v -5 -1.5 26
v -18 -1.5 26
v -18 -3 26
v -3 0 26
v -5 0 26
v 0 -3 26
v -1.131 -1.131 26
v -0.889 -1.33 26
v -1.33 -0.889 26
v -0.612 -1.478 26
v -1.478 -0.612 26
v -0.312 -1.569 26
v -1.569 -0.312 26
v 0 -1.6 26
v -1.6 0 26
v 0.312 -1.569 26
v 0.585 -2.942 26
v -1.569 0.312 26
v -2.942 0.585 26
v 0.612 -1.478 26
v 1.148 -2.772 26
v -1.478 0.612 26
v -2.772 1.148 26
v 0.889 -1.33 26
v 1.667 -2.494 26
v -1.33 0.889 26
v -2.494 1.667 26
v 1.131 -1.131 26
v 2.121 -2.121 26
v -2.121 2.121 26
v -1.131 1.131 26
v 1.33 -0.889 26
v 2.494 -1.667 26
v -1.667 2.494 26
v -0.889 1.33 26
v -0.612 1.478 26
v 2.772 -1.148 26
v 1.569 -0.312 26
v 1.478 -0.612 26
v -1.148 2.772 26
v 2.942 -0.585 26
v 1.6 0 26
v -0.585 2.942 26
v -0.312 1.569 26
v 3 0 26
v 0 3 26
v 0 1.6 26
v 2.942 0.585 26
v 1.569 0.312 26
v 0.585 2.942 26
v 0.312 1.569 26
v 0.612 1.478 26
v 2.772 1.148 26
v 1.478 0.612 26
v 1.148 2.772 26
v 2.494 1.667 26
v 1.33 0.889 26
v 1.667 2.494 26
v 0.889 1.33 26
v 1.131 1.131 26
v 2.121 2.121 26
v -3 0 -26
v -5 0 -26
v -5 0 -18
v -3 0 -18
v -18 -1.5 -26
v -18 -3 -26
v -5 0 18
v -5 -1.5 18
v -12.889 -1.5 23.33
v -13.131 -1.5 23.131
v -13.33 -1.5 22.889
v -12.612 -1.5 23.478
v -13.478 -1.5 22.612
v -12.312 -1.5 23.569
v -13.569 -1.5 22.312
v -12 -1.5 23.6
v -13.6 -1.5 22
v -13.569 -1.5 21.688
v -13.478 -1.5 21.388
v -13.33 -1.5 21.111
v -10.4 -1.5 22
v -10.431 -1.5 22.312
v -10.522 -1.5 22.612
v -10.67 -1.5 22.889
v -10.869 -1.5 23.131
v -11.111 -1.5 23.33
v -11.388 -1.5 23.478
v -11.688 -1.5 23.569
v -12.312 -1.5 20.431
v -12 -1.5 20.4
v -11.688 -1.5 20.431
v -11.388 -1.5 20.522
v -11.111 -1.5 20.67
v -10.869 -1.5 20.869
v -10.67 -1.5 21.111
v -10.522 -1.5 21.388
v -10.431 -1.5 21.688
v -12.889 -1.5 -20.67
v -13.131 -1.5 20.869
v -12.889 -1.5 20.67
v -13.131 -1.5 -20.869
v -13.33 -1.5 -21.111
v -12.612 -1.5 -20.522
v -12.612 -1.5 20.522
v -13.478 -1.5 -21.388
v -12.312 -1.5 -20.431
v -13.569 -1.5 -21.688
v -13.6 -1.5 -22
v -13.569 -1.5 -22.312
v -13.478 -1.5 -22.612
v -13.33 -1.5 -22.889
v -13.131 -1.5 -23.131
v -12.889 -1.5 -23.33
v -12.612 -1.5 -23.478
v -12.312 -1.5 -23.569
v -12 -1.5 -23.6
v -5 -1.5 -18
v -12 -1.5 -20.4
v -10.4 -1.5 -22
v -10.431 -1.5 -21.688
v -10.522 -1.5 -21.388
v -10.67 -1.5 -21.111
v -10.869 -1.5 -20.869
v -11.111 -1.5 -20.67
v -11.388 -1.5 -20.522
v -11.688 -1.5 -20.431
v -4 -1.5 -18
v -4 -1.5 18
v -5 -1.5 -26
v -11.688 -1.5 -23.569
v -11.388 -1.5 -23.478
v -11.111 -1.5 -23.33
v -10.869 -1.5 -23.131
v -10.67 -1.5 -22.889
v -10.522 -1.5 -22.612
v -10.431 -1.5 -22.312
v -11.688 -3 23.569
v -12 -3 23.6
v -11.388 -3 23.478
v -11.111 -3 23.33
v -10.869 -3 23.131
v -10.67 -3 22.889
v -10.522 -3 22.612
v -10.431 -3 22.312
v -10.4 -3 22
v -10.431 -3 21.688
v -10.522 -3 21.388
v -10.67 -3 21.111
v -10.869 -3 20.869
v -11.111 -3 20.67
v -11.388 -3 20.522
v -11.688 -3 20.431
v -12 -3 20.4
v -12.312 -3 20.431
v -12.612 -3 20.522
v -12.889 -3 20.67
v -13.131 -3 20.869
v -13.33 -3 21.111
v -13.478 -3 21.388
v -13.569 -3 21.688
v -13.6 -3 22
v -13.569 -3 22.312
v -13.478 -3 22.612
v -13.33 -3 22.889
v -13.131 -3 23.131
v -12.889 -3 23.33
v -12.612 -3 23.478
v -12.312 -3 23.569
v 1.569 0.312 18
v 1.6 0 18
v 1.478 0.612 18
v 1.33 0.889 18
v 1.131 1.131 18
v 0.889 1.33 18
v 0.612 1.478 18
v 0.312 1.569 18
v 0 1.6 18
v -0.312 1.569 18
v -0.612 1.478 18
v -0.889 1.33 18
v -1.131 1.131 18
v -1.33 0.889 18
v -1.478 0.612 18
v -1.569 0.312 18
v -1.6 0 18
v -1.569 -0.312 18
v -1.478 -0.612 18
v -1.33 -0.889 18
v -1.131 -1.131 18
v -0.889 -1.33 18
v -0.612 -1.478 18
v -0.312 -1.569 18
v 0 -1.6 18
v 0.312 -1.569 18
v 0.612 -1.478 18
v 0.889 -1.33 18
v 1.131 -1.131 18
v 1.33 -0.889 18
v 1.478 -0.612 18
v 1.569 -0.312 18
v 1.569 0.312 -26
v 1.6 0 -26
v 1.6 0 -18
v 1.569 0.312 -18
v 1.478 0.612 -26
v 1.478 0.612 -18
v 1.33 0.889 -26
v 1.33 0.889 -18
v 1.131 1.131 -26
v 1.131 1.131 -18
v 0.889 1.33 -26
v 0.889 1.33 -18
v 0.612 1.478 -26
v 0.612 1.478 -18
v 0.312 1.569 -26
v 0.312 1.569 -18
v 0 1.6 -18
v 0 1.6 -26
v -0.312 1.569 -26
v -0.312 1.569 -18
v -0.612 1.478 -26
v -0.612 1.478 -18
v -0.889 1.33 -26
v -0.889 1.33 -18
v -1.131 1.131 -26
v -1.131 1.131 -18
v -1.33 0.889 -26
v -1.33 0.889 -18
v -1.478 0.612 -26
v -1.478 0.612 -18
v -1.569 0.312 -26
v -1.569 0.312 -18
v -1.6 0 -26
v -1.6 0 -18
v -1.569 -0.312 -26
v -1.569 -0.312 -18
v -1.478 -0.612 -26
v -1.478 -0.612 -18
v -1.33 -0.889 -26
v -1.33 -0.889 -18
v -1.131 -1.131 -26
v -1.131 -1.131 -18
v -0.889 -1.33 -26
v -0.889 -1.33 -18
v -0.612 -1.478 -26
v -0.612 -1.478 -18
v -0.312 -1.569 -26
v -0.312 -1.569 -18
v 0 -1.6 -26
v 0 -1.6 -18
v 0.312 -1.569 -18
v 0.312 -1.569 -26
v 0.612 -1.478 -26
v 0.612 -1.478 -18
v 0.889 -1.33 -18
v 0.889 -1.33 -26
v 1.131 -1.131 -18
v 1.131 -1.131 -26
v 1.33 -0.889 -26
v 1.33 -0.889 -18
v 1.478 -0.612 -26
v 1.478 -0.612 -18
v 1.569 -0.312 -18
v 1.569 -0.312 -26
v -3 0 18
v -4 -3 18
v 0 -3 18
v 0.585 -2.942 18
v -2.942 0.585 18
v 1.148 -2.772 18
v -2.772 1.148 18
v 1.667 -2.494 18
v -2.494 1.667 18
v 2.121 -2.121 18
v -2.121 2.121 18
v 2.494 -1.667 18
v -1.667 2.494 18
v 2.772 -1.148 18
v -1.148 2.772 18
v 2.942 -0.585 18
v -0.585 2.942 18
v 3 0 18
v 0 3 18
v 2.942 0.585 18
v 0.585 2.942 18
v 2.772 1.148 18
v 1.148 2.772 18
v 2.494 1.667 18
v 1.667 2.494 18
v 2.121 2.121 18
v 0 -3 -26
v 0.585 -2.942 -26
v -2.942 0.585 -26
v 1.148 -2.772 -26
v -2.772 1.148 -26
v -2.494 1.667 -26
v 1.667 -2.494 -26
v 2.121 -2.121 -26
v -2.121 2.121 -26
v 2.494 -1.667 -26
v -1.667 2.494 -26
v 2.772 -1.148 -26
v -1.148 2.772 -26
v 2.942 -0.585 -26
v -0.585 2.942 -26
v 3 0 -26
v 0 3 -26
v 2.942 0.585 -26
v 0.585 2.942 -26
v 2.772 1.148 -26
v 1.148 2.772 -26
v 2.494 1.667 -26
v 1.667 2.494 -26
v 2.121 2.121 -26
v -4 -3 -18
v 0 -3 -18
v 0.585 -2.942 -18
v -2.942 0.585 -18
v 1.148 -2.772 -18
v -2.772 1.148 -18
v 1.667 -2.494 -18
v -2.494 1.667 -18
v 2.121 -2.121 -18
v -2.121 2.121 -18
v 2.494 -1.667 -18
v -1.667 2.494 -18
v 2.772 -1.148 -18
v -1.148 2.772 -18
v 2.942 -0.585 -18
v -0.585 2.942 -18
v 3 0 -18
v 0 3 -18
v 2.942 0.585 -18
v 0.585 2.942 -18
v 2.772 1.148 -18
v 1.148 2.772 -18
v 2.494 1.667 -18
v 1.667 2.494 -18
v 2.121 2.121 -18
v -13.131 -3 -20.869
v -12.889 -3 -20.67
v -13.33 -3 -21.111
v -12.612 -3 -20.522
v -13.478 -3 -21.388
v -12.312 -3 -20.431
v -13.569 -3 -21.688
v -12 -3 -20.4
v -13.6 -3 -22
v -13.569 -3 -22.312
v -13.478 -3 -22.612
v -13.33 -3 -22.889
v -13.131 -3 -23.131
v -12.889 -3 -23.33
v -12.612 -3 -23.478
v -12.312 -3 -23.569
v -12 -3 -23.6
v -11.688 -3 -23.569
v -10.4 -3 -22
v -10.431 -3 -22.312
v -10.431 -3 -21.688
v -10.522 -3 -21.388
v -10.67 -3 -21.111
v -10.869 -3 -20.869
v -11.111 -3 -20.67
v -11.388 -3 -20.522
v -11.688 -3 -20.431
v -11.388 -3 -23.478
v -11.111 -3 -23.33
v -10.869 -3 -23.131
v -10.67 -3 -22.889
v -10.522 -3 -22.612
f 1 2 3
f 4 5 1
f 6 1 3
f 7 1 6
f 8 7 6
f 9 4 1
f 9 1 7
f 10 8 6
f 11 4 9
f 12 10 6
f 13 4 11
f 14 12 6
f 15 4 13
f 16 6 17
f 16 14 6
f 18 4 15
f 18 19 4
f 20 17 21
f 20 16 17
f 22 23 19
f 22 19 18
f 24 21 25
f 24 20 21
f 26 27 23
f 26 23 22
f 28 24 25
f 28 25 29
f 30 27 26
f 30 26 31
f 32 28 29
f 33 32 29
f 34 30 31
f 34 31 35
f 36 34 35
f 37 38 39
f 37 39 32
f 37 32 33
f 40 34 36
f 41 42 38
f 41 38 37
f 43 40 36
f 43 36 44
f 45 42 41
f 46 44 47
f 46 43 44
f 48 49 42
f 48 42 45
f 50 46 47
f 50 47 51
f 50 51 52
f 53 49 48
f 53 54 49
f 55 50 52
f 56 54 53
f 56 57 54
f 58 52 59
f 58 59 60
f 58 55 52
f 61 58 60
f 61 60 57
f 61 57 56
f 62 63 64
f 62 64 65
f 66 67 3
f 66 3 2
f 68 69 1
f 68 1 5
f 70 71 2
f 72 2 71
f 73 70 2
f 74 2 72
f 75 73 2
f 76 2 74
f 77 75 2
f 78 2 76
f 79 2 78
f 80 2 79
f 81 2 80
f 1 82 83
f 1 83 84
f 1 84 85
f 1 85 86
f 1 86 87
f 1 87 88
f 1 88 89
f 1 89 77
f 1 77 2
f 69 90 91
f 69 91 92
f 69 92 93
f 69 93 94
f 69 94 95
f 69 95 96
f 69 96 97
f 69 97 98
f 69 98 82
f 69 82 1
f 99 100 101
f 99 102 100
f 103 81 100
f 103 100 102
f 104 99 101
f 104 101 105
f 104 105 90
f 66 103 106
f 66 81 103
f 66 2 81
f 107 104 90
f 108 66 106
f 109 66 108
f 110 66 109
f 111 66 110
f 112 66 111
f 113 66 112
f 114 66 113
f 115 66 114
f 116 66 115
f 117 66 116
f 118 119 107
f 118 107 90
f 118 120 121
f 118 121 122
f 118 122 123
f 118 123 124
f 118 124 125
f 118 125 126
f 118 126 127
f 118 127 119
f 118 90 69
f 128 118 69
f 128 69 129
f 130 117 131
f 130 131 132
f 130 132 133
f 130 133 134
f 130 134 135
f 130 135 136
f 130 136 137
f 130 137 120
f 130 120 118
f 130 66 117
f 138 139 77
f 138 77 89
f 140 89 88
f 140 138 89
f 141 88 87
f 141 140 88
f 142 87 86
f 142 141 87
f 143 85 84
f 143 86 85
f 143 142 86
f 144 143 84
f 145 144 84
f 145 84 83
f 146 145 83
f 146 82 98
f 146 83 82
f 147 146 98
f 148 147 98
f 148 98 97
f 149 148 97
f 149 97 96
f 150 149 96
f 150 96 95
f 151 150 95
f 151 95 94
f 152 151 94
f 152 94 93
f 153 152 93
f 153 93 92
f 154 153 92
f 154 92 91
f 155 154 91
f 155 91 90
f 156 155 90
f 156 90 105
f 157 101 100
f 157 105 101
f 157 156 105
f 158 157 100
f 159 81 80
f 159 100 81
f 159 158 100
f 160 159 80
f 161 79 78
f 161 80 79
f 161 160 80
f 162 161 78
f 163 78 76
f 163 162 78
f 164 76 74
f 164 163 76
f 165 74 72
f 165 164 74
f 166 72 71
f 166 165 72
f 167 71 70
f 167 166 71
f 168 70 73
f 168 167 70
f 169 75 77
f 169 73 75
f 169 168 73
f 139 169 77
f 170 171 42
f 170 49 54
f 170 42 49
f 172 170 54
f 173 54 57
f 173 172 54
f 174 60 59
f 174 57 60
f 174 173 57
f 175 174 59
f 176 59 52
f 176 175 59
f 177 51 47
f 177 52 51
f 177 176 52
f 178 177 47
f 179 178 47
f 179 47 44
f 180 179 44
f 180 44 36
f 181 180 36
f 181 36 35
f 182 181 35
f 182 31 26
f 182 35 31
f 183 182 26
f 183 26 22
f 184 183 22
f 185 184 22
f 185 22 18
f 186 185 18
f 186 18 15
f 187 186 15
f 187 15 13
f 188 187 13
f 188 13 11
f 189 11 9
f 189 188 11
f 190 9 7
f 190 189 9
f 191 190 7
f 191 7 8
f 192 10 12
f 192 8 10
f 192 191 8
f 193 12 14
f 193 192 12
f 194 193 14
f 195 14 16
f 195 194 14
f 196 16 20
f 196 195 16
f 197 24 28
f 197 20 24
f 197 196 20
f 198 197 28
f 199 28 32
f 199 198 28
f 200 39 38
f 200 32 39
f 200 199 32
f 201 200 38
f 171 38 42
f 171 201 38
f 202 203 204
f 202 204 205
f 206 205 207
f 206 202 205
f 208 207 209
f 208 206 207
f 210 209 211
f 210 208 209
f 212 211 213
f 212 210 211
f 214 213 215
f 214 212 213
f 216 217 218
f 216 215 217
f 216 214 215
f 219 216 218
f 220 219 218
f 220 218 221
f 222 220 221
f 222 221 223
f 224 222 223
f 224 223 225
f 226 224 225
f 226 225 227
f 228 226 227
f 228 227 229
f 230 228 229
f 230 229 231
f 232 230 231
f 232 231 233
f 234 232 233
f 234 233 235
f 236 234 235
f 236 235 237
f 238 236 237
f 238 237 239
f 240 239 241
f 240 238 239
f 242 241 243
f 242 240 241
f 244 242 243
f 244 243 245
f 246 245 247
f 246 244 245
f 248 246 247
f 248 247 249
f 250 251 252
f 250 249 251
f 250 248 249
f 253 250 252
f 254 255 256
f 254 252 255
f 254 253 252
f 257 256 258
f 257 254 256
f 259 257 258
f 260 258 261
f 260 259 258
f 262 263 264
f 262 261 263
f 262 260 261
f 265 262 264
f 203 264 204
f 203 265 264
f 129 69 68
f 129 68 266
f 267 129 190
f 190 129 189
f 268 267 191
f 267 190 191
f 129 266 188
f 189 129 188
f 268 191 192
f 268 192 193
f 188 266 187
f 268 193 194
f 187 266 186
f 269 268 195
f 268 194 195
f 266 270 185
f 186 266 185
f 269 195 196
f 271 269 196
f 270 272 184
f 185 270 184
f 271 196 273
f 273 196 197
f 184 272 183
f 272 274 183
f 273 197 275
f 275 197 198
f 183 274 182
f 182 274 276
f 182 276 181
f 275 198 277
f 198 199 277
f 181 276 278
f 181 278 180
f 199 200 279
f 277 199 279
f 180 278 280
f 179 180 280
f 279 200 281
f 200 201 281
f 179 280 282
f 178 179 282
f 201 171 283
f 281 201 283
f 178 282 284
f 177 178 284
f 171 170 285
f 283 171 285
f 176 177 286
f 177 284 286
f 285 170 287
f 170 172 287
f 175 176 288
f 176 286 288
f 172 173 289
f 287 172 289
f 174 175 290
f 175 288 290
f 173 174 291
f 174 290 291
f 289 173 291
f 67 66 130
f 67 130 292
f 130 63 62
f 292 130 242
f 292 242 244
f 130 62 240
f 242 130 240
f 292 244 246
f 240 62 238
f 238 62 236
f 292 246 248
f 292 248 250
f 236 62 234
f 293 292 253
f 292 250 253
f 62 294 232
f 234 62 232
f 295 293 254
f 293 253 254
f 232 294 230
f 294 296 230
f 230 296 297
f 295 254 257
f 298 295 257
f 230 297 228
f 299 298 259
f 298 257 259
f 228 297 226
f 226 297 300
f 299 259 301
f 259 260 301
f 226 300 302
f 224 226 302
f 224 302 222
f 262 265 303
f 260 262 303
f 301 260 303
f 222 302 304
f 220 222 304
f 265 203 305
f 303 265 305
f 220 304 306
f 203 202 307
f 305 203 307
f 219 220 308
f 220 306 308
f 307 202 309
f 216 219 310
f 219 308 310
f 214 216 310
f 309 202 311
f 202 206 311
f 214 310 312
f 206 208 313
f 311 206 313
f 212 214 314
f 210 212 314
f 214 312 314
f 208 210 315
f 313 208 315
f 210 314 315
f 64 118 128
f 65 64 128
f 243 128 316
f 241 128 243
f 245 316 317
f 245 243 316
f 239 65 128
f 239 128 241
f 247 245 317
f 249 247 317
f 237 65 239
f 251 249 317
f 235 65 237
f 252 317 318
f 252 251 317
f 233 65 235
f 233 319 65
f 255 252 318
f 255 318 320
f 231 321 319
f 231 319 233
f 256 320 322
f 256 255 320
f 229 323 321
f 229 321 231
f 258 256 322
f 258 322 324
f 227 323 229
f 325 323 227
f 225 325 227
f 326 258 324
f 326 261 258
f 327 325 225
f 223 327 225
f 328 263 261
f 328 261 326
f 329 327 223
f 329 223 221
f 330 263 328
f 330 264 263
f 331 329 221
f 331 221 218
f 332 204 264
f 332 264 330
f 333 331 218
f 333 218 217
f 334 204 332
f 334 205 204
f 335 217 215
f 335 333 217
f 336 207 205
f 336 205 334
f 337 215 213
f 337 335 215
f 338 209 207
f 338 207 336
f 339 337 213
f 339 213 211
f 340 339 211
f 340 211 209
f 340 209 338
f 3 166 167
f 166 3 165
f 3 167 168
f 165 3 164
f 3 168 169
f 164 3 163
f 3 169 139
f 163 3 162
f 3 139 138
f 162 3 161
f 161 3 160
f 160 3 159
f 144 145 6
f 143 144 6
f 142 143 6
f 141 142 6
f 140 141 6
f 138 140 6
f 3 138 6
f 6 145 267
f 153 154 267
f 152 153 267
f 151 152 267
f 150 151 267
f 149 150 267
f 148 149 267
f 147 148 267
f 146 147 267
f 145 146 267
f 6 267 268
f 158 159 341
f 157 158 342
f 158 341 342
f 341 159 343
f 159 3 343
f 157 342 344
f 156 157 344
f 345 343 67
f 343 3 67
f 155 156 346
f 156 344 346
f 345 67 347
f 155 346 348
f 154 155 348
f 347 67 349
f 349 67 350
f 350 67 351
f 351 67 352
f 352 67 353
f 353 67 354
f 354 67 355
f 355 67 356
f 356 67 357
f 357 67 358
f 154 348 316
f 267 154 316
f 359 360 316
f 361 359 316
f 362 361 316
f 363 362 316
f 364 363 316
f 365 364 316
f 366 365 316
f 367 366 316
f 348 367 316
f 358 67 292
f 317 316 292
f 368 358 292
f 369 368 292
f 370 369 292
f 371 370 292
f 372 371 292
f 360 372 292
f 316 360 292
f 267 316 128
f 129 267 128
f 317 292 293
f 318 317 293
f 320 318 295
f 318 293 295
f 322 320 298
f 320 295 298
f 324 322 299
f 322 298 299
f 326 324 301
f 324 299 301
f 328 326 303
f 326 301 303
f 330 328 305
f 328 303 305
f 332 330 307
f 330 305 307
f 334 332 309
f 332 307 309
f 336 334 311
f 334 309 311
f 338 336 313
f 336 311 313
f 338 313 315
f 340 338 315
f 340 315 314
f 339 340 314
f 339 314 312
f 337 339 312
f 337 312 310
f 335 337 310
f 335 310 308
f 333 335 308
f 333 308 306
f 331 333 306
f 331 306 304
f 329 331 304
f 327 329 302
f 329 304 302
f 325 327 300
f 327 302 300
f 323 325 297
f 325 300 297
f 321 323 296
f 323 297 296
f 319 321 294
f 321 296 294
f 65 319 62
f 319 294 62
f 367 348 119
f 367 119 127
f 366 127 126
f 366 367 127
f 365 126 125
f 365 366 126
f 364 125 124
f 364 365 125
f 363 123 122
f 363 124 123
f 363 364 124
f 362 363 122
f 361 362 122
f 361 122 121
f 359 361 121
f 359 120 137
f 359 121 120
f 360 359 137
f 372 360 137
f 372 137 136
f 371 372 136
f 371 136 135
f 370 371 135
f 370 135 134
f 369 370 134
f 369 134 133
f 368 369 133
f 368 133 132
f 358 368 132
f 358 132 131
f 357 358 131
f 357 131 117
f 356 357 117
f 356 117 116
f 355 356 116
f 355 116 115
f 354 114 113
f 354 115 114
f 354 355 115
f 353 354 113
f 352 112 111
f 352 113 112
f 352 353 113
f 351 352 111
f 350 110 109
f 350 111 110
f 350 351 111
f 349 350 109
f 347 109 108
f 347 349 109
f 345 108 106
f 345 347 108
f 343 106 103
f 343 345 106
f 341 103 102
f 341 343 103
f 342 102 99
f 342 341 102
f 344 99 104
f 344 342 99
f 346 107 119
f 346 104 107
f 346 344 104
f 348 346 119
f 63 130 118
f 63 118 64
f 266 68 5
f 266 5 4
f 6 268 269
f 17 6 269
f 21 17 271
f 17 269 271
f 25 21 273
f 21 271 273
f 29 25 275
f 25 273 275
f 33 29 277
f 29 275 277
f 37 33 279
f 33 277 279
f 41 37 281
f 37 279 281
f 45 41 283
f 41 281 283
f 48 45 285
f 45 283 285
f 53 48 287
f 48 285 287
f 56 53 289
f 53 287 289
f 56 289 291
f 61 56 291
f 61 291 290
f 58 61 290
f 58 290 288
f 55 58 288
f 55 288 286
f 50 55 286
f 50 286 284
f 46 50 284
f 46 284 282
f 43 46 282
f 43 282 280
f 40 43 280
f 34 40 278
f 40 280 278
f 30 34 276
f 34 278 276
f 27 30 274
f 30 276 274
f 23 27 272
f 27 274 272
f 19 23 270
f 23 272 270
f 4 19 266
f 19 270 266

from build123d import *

# Parameters (mm, degrees)
EXTRUDE_START             = -26
SKETCH_1_W                = 14
SKETCH_1_H                = 1.5
EXTRUDE_241_DEPTH         = 52
SKETCH_2_W                = 5
SKETCH_2_H                = 3
EXTRUDE_321_DEPTH         = 8
SKETCH_3_R                = 3
EXTRUDE_392_DEPTH         = 8
EXTRUDE_START_2           = 18
SKETCH_4_W                = 5
SKETCH_4_H                = 3
EXTRUDE_4_DEPTH           = 8
SKETCH_5_R                = 3
EXTRUDE_5_DEPTH           = 8
D3P2_START                = -28
SKETCH_6_R                = 1.6
D3P2_DEPTH                = 56
CUT_EXTRUDE_M3_DEPTH      = 100
CUT_EXTRUDE_M3_DEPTH_BACK = 100
SKETCH_7_R                = 1.6
CUT_EXTRUDE_3_DEPTH       = 100
CUT_EXTRUDE_3_DEPTH_BACK  = 100
SKETCH_8_R                = 1.6


with BuildPart() as part:
    # 草图1 → Extrude 241 (new body)
    with BuildSketch(Plane.XY.offset(EXTRUDE_START)):
        with Locations((-11, -2.25)):
            Rectangle(SKETCH_1_W, SKETCH_1_H)
    extrude(amount=EXTRUDE_241_DEPTH)

    # 草图2 → Extrude 321 (add)
    with BuildSketch(Plane.XY.offset(EXTRUDE_START)):
        with Locations((-2.5, -1.5)):
            Rectangle(SKETCH_2_W, SKETCH_2_H)
    extrude(amount=EXTRUDE_321_DEPTH)

    # 草图3 → Extrude 392 (add)
    with BuildSketch(Plane.XY.offset(EXTRUDE_START)):
        Circle(SKETCH_3_R)
    extrude(amount=EXTRUDE_392_DEPTH)

    # 草图4 → 凸台-拉伸4 (add)
    with BuildSketch(Plane.XY.offset(EXTRUDE_START_2)):
        with Locations((-2.5, -1.5)):
            Rectangle(SKETCH_4_W, SKETCH_4_H)
    extrude(amount=EXTRUDE_4_DEPTH)

    # 草图5 → 凸台-拉伸5 (add)
    with BuildSketch(Plane.XY.offset(EXTRUDE_START_2)):
        Circle(SKETCH_5_R)
    extrude(amount=EXTRUDE_5_DEPTH)

    # 草图6 → D3p2转轴通孔 (cut)
    with BuildSketch(Plane.XY.offset(D3P2_START)):
        Circle(SKETCH_6_R)
    extrude(amount=D3P2_DEPTH, mode=Mode.SUBTRACT)

    # 草图7 → 底板M3安装孔 (cut, two sides: drawn at the far end of the back side and taken through both)
    with BuildSketch(Plane(origin=(0, 0, 0), x_dir=(1, 0, 0), z_dir=(0, 1, 0)).offset(-CUT_EXTRUDE_M3_DEPTH_BACK)):
        with Locations(Location((-12, 22, 0), (0, 0, 270))):
            Circle(SKETCH_7_R)
    extrude(amount=CUT_EXTRUDE_M3_DEPTH + CUT_EXTRUDE_M3_DEPTH_BACK, mode=Mode.SUBTRACT)

    # 草图8 → 切除-拉伸3 (cut, two sides: drawn at the far end of the back side and taken through both)
    with BuildSketch(Plane(origin=(0, 0, 0), x_dir=(1, 0, 0), z_dir=(0, 1, 0)).offset(-CUT_EXTRUDE_3_DEPTH_BACK)):
        with Locations(Location((-12, -22, 0), (0, 0, 270))):
            Circle(SKETCH_8_R)
    extrude(amount=CUT_EXTRUDE_3_DEPTH + CUT_EXTRUDE_3_DEPTH_BACK, mode=Mode.SUBTRACT)


solid = part.part
